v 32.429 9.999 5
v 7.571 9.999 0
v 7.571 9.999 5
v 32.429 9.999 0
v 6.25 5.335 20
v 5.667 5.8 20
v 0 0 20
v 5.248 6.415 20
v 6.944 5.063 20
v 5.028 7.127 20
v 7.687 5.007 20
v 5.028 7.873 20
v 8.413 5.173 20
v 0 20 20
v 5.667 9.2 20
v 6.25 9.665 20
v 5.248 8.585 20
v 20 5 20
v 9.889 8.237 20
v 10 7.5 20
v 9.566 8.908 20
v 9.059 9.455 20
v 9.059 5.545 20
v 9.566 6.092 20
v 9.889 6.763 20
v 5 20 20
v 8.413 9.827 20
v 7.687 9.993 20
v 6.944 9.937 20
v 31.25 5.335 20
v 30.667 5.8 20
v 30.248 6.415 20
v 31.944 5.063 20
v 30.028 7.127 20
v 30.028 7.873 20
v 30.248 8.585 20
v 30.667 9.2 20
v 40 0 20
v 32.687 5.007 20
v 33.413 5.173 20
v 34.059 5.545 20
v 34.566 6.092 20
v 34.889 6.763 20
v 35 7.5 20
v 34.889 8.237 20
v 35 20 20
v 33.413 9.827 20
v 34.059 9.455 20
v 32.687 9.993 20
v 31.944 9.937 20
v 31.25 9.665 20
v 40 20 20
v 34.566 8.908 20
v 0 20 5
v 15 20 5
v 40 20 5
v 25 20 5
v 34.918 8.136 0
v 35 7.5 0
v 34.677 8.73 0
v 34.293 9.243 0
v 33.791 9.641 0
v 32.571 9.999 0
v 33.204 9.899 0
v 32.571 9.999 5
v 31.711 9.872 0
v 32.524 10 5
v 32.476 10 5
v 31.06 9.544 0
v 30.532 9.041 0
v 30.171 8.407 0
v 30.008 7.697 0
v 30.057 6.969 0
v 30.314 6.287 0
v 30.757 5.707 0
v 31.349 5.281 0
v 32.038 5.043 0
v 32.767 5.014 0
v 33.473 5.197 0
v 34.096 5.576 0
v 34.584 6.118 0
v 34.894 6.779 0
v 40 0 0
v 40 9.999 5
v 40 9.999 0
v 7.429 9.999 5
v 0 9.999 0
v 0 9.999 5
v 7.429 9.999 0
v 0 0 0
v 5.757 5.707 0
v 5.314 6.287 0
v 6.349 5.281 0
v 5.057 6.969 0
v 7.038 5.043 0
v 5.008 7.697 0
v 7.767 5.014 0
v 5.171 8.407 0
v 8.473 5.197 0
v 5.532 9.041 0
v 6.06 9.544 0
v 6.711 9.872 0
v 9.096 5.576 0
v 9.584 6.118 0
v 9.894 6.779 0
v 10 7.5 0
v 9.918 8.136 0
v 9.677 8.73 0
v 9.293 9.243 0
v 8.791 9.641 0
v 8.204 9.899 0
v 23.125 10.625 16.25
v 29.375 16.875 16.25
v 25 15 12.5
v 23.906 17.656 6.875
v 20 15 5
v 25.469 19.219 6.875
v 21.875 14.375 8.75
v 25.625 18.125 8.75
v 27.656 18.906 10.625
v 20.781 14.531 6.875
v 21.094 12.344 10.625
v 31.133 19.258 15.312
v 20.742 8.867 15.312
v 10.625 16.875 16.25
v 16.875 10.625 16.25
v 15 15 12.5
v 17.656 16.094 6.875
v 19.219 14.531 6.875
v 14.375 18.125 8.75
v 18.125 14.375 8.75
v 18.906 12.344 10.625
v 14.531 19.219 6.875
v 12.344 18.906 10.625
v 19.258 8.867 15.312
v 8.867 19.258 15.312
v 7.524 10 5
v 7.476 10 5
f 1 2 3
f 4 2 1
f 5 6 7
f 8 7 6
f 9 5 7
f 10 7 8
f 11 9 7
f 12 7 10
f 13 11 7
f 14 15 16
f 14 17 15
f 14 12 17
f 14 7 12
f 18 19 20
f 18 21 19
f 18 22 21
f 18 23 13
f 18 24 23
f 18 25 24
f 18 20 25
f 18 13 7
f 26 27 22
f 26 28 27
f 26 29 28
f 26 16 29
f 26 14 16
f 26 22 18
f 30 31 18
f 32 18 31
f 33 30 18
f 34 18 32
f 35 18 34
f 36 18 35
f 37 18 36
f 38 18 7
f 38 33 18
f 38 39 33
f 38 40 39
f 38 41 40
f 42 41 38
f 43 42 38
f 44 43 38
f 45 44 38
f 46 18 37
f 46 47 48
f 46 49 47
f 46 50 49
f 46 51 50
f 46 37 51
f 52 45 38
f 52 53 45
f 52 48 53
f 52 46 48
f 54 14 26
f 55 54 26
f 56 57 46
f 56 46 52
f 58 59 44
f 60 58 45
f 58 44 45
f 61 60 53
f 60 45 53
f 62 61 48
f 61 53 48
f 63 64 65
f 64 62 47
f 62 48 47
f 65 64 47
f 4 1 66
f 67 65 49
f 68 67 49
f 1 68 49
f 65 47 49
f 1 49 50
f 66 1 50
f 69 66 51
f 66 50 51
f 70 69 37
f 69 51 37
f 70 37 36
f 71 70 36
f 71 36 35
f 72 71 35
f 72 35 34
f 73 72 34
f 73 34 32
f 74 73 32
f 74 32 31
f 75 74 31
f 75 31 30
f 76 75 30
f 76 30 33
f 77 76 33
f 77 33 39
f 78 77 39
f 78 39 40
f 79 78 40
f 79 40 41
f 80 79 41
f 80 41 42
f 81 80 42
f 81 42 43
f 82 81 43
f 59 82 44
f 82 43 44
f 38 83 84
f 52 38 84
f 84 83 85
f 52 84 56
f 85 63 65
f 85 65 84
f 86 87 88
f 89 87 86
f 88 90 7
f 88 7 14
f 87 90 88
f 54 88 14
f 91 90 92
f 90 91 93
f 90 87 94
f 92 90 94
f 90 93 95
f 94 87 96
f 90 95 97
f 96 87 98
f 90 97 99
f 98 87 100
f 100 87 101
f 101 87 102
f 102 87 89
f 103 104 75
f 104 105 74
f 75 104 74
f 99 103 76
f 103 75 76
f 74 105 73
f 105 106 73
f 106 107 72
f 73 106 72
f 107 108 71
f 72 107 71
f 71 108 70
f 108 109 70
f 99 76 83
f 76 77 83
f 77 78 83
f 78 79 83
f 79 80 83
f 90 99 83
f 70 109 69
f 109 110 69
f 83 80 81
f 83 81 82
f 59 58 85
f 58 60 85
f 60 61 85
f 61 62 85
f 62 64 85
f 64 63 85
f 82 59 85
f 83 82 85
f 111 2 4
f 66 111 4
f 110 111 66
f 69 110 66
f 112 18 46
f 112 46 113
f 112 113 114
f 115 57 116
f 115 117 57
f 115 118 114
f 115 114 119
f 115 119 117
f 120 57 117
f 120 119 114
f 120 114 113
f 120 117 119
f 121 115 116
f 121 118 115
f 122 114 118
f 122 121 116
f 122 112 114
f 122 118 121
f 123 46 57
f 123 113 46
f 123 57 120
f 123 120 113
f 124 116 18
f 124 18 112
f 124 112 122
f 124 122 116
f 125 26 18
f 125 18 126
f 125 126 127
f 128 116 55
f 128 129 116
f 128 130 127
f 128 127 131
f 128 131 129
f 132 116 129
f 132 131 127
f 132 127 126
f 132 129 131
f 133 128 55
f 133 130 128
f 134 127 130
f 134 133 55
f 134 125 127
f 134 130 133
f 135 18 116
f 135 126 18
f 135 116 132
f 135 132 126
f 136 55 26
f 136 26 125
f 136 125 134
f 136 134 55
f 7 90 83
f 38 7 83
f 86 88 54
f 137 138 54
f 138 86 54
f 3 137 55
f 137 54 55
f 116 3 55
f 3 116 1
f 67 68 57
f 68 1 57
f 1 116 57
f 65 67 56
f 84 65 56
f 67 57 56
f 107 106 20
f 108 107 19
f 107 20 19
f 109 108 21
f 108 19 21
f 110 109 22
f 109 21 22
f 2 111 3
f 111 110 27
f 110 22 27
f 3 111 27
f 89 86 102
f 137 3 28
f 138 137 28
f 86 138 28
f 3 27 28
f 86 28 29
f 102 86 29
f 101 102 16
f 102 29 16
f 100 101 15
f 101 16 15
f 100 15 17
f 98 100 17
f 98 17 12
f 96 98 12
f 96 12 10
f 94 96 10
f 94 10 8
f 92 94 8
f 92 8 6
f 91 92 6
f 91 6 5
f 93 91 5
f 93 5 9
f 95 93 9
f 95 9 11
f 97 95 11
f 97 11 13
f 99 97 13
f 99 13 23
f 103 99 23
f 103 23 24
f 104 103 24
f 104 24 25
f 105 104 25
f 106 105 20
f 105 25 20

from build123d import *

# Parameters (mm, degrees)
IZIM1_W                     = 40
IZIM1_H                     = 20
Y_KSEKLIK_EKSTR_ZYON1_DEPTH = 20
IZIM2_R                     = 2.5
KES_EKSTR_ZYON1_DEPTH       = 20
IZIM3_W                     = 40
IZIM3_H                     = 5
KES_EKSTR_ZYON3_DEPTH       = 9
IZIM6_W                     = 40
IZIM6_H                     = 5
KES_EKSTR_ZYON13_DEPTH      = 1.001


with BuildPart() as part:
    # Çizim1 → Yükseklik-Ekstrüzyon1 (new body)
    with BuildSketch(Plane.XY):
        with Locations((20, 10)):
            Rectangle(IZIM1_W, IZIM1_H)
    extrude(amount=Y_KSEKLIK_EKSTR_ZYON1_DEPTH)

    # Çizim2 → Kes-Ekstrüzyon1 (cut)
    with BuildSketch(Plane.XY.offset(20)):
        with Locations((7.5, 7.5)):
            Circle(IZIM2_R)
        with Locations((32.5, 7.5)):
            Circle(IZIM2_R)
    extrude(amount=-KES_EKSTR_ZYON1_DEPTH, mode=Mode.SUBTRACT)

    # Çizim3 → Kes-Ekstrüzyon3 (cut)
    with BuildSketch(Plane(origin=(0, 20, 0), x_dir=(1, 0, 0), z_dir=(0, 1, 0))):
        with Locations((20, -2.5)):
            Rectangle(IZIM3_W, IZIM3_H)
    extrude(amount=-KES_EKSTR_ZYON3_DEPTH, mode=Mode.SUBTRACT)

    # Çizim5 → Kes-Loft2 section 0
    with BuildSketch(Plane(origin=(0, 0, 5), x_dir=(-1, 0, 0), z_dir=(0, 0, -1))):
        Polygon((-25, 20), (-20, 15), (-15, 20), align=None)
    # Çizim4 → Kes-Loft2 section 1
    with BuildSketch(Plane.XY.offset(20)):
        Polygon((5, 20), (20, 5), (35, 20), align=None)
    loft(mode=Mode.SUBTRACT)

    # Çizim6 → Kes-Ekstrüzyon13 (cut)
    with BuildSketch(Plane(origin=(0, 11, 0), x_dir=(1, 0, 0), z_dir=(0, 1, 0))):
        with Locations((20, -2.5)):
            Rectangle(IZIM6_W, IZIM6_H)
    extrude(amount=-KES_EKSTR_ZYON13_DEPTH, mode=Mode.SUBTRACT)


solid = part.part
